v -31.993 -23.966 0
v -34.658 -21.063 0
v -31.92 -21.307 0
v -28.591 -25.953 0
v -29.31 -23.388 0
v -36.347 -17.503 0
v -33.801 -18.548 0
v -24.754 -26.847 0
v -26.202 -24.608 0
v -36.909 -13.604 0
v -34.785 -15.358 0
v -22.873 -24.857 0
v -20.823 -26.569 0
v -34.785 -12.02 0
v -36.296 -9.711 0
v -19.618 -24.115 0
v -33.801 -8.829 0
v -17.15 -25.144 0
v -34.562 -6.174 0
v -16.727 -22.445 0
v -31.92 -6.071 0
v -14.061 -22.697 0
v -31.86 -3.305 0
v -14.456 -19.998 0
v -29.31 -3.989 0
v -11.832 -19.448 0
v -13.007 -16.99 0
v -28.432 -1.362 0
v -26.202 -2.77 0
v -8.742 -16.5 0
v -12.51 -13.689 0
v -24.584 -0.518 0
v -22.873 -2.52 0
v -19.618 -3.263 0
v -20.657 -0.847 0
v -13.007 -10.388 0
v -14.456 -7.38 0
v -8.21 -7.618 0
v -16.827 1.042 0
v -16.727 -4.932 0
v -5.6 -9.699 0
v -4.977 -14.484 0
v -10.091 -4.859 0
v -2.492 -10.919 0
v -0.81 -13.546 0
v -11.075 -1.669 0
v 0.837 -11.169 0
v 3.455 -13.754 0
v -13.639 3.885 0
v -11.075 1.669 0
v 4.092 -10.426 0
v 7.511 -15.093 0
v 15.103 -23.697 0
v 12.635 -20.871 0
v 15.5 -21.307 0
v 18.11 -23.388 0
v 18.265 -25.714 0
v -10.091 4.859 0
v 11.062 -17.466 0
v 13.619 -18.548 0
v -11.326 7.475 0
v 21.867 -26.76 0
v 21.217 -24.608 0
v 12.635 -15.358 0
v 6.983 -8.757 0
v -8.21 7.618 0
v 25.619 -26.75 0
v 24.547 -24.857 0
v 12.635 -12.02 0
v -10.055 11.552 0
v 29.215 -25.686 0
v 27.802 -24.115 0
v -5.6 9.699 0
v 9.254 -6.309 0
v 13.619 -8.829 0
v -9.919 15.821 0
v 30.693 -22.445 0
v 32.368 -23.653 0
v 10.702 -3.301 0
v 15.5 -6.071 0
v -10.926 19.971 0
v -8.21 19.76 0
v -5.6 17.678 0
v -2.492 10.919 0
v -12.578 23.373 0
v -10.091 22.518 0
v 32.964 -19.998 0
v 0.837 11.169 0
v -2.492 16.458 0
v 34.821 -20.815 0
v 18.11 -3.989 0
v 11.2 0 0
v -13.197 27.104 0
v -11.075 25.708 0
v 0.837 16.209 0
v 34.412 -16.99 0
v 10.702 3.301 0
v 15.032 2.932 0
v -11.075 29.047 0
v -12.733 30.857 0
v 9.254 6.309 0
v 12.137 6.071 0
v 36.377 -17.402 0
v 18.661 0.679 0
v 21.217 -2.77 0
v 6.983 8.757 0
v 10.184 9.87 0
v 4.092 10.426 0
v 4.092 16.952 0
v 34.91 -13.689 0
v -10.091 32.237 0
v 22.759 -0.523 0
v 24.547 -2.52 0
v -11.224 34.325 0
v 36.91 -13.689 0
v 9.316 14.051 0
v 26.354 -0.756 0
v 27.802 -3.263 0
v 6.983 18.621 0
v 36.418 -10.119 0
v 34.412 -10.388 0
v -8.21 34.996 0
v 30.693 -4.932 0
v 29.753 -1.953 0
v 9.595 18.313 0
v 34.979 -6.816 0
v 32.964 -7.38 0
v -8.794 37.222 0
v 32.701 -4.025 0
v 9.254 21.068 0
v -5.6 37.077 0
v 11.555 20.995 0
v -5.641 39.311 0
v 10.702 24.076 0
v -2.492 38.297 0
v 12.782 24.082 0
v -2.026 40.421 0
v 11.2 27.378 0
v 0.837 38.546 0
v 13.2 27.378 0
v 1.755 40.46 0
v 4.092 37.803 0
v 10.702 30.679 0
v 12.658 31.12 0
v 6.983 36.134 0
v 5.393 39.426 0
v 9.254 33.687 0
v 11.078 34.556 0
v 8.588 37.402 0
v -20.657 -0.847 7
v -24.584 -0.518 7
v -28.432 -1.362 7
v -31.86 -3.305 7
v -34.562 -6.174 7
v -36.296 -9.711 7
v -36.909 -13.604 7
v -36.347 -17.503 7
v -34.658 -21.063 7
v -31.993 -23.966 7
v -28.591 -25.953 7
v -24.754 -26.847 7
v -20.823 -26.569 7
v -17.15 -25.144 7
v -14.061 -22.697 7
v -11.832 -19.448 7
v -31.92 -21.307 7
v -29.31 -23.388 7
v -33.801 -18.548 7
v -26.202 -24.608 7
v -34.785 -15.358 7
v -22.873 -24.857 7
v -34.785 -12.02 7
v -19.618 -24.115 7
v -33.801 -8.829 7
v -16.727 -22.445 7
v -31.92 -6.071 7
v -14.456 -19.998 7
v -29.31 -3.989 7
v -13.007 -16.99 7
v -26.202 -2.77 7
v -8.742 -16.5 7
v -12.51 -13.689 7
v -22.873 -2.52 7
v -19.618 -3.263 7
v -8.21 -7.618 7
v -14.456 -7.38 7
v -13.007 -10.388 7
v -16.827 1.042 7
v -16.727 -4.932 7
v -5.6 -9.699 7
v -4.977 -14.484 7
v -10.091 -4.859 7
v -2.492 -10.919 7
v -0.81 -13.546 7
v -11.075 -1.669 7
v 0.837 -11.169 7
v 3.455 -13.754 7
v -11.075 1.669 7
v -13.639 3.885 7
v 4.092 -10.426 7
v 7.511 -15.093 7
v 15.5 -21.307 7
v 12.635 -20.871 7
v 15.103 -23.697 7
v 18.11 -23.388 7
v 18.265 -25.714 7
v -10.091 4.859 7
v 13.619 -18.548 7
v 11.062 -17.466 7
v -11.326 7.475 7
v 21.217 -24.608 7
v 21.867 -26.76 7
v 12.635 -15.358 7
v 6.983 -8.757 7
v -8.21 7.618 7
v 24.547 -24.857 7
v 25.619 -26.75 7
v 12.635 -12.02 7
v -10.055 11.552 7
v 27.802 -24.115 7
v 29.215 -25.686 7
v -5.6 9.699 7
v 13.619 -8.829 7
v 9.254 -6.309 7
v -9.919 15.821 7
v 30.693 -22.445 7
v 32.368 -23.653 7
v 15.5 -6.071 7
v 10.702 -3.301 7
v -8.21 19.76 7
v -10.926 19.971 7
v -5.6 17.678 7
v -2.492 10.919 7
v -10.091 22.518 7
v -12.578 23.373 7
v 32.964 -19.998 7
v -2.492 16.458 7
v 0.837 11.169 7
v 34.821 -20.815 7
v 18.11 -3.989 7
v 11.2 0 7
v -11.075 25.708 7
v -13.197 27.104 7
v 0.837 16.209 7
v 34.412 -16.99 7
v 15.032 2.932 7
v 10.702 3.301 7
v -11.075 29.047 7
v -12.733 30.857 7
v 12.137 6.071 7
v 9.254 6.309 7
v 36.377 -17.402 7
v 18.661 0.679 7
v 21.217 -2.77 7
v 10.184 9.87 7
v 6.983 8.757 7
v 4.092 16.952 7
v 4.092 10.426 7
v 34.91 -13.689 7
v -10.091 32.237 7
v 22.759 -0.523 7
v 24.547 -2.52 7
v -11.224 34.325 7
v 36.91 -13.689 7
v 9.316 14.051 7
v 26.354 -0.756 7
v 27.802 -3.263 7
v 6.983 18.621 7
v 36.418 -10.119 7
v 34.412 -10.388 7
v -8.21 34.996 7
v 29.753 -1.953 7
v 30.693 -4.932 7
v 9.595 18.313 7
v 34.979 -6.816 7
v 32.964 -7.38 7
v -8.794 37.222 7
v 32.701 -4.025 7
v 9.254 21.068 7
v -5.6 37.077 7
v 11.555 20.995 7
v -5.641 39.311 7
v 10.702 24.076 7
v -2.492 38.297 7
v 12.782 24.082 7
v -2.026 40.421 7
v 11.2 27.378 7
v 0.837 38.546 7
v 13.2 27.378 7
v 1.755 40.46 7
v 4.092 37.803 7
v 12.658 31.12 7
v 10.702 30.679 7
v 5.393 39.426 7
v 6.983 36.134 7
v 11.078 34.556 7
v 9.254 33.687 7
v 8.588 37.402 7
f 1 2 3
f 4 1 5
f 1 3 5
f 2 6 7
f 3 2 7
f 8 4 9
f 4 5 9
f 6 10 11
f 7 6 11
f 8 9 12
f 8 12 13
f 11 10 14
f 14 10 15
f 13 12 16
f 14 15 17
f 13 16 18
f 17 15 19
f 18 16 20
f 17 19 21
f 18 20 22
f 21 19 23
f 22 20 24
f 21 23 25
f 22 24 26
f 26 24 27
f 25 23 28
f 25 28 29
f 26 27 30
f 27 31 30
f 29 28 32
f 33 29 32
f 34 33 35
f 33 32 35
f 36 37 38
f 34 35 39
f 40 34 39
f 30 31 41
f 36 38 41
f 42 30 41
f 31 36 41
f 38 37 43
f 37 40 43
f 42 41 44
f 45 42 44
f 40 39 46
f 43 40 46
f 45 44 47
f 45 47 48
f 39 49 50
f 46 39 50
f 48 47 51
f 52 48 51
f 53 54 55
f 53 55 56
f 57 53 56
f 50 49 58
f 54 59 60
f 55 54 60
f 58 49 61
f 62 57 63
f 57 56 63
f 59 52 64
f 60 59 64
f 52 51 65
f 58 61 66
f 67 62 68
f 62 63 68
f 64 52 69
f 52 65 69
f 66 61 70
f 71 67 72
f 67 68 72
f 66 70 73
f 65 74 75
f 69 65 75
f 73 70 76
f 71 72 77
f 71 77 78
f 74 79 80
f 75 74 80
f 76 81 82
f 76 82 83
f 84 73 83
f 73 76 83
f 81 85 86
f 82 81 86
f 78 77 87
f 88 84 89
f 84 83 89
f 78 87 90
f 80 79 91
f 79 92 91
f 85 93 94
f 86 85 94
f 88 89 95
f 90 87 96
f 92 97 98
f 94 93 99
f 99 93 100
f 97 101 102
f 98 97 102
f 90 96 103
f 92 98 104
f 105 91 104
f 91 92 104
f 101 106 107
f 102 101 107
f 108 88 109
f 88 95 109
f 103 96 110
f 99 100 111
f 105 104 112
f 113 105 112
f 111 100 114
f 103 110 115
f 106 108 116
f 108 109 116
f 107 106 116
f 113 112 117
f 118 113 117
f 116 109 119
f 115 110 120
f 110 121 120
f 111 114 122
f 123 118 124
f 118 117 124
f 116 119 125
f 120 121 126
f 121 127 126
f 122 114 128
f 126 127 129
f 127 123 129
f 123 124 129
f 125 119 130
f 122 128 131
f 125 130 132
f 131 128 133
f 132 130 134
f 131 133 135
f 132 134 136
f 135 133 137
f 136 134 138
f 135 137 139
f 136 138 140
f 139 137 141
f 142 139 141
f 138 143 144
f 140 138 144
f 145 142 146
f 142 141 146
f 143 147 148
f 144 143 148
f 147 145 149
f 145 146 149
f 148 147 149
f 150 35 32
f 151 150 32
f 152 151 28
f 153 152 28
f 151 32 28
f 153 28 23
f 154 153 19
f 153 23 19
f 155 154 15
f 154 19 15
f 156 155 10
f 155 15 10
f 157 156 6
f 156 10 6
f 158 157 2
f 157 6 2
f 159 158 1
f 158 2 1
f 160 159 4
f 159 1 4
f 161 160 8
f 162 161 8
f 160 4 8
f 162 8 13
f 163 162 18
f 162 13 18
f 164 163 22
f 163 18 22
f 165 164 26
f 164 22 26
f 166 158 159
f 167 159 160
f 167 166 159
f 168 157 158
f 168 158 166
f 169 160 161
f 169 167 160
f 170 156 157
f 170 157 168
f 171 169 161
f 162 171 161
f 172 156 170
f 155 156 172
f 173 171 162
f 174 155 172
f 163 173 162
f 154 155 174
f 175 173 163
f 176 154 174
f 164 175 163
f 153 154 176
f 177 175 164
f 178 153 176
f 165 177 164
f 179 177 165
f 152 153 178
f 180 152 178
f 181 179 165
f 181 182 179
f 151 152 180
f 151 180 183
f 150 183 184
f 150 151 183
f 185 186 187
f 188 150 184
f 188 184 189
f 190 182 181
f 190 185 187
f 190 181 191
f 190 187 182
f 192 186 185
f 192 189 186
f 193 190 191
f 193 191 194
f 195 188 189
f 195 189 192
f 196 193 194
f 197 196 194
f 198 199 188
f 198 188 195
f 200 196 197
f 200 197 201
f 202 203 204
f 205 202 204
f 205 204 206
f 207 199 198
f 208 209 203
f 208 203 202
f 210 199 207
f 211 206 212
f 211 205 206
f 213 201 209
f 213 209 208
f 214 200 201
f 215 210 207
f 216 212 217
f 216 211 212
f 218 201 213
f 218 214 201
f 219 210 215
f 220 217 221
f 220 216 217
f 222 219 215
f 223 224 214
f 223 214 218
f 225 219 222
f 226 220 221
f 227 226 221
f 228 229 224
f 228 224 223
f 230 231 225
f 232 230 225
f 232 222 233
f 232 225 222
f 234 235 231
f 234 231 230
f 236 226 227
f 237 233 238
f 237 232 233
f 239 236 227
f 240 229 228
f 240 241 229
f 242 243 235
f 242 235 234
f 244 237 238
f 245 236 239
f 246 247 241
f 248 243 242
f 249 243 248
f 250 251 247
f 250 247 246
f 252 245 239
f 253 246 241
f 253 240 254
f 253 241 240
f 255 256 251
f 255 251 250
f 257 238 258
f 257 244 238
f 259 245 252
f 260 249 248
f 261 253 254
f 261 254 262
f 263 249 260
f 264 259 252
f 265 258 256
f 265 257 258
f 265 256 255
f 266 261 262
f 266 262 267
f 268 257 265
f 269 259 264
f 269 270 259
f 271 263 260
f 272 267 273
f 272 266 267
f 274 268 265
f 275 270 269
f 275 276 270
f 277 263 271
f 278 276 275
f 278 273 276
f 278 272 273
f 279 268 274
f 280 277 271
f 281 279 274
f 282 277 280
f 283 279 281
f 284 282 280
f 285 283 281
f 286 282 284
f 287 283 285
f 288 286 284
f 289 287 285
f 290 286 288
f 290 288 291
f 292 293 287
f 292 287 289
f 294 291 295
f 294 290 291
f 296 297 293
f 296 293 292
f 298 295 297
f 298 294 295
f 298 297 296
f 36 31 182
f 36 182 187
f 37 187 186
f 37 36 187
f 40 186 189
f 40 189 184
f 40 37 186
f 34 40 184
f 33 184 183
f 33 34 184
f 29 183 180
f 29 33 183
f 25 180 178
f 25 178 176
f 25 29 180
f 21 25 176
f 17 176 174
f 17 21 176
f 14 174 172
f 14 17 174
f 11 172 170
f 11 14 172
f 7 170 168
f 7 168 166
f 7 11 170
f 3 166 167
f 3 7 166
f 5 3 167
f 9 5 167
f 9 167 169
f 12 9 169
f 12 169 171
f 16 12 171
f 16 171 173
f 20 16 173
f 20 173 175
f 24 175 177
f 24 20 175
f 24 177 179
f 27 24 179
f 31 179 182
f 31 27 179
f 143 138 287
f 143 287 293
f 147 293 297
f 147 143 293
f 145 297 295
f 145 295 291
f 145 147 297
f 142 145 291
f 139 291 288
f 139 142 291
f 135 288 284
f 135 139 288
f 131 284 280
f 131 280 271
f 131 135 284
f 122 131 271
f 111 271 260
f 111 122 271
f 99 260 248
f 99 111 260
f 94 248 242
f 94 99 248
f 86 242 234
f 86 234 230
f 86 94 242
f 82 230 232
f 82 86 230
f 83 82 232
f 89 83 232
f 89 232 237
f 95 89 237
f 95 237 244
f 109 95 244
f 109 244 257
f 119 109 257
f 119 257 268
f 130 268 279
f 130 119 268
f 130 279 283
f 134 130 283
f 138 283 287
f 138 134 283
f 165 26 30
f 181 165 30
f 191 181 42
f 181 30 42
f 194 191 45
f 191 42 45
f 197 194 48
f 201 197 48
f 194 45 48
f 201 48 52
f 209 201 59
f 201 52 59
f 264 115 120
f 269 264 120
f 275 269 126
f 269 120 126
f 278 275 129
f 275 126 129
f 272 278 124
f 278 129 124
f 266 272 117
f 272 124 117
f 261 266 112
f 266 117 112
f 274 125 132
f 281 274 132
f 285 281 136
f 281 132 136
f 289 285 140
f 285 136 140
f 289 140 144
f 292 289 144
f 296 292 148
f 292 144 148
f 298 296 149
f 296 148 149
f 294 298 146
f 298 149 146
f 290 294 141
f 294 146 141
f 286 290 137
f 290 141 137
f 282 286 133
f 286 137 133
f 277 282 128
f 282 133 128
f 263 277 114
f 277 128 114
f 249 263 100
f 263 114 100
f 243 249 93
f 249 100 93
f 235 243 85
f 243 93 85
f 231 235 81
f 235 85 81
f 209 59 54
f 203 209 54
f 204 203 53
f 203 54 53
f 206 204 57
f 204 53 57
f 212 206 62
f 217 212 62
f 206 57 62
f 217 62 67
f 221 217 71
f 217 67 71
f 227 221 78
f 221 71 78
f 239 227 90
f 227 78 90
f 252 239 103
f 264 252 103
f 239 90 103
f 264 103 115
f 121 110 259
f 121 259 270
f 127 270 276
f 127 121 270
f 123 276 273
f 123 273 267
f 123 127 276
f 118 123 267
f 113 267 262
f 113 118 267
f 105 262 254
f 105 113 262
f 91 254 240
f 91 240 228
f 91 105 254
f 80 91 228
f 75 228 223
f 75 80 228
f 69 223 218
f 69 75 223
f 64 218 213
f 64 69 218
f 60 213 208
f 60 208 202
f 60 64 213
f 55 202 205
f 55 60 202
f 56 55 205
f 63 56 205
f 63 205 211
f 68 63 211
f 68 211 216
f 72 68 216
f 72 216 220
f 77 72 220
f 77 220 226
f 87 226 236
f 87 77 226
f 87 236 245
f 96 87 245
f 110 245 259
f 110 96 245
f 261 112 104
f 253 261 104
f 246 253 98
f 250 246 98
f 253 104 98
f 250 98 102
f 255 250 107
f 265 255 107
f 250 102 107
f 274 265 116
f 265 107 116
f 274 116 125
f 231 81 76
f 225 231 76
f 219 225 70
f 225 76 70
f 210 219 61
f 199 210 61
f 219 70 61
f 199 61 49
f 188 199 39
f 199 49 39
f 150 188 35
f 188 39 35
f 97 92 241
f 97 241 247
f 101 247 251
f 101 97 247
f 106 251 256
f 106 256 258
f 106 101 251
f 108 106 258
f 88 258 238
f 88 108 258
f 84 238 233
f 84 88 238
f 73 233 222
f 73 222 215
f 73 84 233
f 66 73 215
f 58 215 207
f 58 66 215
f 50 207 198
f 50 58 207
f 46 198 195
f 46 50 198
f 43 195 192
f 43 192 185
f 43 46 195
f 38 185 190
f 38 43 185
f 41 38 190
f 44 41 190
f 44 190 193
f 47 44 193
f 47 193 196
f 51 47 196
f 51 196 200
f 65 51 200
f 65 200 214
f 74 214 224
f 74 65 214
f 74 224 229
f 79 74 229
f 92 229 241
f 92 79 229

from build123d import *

# Parameters (mm, degrees)
F0_R     = 13.2
F0_R_2   = 11.2
F1_DEPTH = 7


with BuildPart() as f1:
    # F0 (on Top) → F1 (new body)
    with BuildSketch(Plane.XY):
        with BuildLine():
            ThreePointArc((9.5953492139, 18.3128915938), (-1.0631566346, 14.2205026085), (-10.9263000524, 19.9711370473))
            ThreePointArc((-10.9263000524, 19.9711370473), (-11.3263382991, 7.4750183656), (-20.6571039439, -0.8466296194))
            ThreePointArc((-20.6571039439, -0.8466296194), (-13.3527241318, -5.5051193862), (-10.509713096, -13.6888092384))
            ThreePointArc((-10.509713096, -13.6888092384), (-10.8446240081, -16.6433790483), (-11.8323619992, -19.4480219384))
            ThreePointArc((-11.8323619992, -19.4480219384), (-0.8103866488, -13.5464058816), (11.06175473, -17.4662619743))
            ThreePointArc((11.06175473, -17.4662619743), (12.8468948308, -6.1895306505), (22.7586620517, -0.5231151089))
            ThreePointArc((22.7586620517, -0.5231151089), (12.1367249479, 6.071387516), (9.5953492139, 18.3128915938))
        make_face()
        Circle(F0_R, mode=Mode.SUBTRACT)
        with BuildLine():
            ThreePointArc((9.5953492139, 18.3128915938), (12.2657777907, 22.5000478532), (13.2, 27.3776184767))
            ThreePointArc((13.2, 27.3776184767), (-3.8738120313, 39.9963973537), (-10.9263000524, 19.9711370473))
            ThreePointArc((-10.9263000524, 19.9711370473), (-1.0631566346, 14.2205026085), (9.5953492139, 18.3128915938))
        make_face()
        with Locations((0, 27.3776184767)):
            Circle(F0_R_2, mode=Mode.SUBTRACT)
        with BuildLine():
            ThreePointArc((-10.509713096, -13.6888092384), (-13.3527241318, -5.5051193862), (-20.6571039439, -0.8466296194))
            ThreePointArc((-20.6571039439, -0.8466296194), (-35.6356879957, -19.3466465187), (-11.8323619992, -19.4480219384))
            ThreePointArc((-11.8323619992, -19.4480219384), (-10.8446240081, -16.6433790483), (-10.509713096, -13.6888092384))
        make_face()
        with Locations((-23.709713096, -13.6888092384)):
            Circle(F0_R_2, mode=Mode.SUBTRACT)
        with BuildLine():
            ThreePointArc((36.909713096, -13.6888092384), (32.7009901525, -4.0246001713), (22.7586620517, -0.5231151089))
            ThreePointArc((22.7586620517, -0.5231151089), (12.8468948308, -6.1895306505), (11.06175473, -17.4662619743))
            ThreePointArc((11.06175473, -17.4662619743), (25.6185019226, -26.7500697141), (36.909713096, -13.6888092384))
        make_face()
        with Locations((23.709713096, -13.6888092384)):
            Circle(F0_R_2, mode=Mode.SUBTRACT)
        Circle(F0_R)
        Circle(F0_R_2, mode=Mode.SUBTRACT)
    extrude(amount=F1_DEPTH)


solid = f1.part
